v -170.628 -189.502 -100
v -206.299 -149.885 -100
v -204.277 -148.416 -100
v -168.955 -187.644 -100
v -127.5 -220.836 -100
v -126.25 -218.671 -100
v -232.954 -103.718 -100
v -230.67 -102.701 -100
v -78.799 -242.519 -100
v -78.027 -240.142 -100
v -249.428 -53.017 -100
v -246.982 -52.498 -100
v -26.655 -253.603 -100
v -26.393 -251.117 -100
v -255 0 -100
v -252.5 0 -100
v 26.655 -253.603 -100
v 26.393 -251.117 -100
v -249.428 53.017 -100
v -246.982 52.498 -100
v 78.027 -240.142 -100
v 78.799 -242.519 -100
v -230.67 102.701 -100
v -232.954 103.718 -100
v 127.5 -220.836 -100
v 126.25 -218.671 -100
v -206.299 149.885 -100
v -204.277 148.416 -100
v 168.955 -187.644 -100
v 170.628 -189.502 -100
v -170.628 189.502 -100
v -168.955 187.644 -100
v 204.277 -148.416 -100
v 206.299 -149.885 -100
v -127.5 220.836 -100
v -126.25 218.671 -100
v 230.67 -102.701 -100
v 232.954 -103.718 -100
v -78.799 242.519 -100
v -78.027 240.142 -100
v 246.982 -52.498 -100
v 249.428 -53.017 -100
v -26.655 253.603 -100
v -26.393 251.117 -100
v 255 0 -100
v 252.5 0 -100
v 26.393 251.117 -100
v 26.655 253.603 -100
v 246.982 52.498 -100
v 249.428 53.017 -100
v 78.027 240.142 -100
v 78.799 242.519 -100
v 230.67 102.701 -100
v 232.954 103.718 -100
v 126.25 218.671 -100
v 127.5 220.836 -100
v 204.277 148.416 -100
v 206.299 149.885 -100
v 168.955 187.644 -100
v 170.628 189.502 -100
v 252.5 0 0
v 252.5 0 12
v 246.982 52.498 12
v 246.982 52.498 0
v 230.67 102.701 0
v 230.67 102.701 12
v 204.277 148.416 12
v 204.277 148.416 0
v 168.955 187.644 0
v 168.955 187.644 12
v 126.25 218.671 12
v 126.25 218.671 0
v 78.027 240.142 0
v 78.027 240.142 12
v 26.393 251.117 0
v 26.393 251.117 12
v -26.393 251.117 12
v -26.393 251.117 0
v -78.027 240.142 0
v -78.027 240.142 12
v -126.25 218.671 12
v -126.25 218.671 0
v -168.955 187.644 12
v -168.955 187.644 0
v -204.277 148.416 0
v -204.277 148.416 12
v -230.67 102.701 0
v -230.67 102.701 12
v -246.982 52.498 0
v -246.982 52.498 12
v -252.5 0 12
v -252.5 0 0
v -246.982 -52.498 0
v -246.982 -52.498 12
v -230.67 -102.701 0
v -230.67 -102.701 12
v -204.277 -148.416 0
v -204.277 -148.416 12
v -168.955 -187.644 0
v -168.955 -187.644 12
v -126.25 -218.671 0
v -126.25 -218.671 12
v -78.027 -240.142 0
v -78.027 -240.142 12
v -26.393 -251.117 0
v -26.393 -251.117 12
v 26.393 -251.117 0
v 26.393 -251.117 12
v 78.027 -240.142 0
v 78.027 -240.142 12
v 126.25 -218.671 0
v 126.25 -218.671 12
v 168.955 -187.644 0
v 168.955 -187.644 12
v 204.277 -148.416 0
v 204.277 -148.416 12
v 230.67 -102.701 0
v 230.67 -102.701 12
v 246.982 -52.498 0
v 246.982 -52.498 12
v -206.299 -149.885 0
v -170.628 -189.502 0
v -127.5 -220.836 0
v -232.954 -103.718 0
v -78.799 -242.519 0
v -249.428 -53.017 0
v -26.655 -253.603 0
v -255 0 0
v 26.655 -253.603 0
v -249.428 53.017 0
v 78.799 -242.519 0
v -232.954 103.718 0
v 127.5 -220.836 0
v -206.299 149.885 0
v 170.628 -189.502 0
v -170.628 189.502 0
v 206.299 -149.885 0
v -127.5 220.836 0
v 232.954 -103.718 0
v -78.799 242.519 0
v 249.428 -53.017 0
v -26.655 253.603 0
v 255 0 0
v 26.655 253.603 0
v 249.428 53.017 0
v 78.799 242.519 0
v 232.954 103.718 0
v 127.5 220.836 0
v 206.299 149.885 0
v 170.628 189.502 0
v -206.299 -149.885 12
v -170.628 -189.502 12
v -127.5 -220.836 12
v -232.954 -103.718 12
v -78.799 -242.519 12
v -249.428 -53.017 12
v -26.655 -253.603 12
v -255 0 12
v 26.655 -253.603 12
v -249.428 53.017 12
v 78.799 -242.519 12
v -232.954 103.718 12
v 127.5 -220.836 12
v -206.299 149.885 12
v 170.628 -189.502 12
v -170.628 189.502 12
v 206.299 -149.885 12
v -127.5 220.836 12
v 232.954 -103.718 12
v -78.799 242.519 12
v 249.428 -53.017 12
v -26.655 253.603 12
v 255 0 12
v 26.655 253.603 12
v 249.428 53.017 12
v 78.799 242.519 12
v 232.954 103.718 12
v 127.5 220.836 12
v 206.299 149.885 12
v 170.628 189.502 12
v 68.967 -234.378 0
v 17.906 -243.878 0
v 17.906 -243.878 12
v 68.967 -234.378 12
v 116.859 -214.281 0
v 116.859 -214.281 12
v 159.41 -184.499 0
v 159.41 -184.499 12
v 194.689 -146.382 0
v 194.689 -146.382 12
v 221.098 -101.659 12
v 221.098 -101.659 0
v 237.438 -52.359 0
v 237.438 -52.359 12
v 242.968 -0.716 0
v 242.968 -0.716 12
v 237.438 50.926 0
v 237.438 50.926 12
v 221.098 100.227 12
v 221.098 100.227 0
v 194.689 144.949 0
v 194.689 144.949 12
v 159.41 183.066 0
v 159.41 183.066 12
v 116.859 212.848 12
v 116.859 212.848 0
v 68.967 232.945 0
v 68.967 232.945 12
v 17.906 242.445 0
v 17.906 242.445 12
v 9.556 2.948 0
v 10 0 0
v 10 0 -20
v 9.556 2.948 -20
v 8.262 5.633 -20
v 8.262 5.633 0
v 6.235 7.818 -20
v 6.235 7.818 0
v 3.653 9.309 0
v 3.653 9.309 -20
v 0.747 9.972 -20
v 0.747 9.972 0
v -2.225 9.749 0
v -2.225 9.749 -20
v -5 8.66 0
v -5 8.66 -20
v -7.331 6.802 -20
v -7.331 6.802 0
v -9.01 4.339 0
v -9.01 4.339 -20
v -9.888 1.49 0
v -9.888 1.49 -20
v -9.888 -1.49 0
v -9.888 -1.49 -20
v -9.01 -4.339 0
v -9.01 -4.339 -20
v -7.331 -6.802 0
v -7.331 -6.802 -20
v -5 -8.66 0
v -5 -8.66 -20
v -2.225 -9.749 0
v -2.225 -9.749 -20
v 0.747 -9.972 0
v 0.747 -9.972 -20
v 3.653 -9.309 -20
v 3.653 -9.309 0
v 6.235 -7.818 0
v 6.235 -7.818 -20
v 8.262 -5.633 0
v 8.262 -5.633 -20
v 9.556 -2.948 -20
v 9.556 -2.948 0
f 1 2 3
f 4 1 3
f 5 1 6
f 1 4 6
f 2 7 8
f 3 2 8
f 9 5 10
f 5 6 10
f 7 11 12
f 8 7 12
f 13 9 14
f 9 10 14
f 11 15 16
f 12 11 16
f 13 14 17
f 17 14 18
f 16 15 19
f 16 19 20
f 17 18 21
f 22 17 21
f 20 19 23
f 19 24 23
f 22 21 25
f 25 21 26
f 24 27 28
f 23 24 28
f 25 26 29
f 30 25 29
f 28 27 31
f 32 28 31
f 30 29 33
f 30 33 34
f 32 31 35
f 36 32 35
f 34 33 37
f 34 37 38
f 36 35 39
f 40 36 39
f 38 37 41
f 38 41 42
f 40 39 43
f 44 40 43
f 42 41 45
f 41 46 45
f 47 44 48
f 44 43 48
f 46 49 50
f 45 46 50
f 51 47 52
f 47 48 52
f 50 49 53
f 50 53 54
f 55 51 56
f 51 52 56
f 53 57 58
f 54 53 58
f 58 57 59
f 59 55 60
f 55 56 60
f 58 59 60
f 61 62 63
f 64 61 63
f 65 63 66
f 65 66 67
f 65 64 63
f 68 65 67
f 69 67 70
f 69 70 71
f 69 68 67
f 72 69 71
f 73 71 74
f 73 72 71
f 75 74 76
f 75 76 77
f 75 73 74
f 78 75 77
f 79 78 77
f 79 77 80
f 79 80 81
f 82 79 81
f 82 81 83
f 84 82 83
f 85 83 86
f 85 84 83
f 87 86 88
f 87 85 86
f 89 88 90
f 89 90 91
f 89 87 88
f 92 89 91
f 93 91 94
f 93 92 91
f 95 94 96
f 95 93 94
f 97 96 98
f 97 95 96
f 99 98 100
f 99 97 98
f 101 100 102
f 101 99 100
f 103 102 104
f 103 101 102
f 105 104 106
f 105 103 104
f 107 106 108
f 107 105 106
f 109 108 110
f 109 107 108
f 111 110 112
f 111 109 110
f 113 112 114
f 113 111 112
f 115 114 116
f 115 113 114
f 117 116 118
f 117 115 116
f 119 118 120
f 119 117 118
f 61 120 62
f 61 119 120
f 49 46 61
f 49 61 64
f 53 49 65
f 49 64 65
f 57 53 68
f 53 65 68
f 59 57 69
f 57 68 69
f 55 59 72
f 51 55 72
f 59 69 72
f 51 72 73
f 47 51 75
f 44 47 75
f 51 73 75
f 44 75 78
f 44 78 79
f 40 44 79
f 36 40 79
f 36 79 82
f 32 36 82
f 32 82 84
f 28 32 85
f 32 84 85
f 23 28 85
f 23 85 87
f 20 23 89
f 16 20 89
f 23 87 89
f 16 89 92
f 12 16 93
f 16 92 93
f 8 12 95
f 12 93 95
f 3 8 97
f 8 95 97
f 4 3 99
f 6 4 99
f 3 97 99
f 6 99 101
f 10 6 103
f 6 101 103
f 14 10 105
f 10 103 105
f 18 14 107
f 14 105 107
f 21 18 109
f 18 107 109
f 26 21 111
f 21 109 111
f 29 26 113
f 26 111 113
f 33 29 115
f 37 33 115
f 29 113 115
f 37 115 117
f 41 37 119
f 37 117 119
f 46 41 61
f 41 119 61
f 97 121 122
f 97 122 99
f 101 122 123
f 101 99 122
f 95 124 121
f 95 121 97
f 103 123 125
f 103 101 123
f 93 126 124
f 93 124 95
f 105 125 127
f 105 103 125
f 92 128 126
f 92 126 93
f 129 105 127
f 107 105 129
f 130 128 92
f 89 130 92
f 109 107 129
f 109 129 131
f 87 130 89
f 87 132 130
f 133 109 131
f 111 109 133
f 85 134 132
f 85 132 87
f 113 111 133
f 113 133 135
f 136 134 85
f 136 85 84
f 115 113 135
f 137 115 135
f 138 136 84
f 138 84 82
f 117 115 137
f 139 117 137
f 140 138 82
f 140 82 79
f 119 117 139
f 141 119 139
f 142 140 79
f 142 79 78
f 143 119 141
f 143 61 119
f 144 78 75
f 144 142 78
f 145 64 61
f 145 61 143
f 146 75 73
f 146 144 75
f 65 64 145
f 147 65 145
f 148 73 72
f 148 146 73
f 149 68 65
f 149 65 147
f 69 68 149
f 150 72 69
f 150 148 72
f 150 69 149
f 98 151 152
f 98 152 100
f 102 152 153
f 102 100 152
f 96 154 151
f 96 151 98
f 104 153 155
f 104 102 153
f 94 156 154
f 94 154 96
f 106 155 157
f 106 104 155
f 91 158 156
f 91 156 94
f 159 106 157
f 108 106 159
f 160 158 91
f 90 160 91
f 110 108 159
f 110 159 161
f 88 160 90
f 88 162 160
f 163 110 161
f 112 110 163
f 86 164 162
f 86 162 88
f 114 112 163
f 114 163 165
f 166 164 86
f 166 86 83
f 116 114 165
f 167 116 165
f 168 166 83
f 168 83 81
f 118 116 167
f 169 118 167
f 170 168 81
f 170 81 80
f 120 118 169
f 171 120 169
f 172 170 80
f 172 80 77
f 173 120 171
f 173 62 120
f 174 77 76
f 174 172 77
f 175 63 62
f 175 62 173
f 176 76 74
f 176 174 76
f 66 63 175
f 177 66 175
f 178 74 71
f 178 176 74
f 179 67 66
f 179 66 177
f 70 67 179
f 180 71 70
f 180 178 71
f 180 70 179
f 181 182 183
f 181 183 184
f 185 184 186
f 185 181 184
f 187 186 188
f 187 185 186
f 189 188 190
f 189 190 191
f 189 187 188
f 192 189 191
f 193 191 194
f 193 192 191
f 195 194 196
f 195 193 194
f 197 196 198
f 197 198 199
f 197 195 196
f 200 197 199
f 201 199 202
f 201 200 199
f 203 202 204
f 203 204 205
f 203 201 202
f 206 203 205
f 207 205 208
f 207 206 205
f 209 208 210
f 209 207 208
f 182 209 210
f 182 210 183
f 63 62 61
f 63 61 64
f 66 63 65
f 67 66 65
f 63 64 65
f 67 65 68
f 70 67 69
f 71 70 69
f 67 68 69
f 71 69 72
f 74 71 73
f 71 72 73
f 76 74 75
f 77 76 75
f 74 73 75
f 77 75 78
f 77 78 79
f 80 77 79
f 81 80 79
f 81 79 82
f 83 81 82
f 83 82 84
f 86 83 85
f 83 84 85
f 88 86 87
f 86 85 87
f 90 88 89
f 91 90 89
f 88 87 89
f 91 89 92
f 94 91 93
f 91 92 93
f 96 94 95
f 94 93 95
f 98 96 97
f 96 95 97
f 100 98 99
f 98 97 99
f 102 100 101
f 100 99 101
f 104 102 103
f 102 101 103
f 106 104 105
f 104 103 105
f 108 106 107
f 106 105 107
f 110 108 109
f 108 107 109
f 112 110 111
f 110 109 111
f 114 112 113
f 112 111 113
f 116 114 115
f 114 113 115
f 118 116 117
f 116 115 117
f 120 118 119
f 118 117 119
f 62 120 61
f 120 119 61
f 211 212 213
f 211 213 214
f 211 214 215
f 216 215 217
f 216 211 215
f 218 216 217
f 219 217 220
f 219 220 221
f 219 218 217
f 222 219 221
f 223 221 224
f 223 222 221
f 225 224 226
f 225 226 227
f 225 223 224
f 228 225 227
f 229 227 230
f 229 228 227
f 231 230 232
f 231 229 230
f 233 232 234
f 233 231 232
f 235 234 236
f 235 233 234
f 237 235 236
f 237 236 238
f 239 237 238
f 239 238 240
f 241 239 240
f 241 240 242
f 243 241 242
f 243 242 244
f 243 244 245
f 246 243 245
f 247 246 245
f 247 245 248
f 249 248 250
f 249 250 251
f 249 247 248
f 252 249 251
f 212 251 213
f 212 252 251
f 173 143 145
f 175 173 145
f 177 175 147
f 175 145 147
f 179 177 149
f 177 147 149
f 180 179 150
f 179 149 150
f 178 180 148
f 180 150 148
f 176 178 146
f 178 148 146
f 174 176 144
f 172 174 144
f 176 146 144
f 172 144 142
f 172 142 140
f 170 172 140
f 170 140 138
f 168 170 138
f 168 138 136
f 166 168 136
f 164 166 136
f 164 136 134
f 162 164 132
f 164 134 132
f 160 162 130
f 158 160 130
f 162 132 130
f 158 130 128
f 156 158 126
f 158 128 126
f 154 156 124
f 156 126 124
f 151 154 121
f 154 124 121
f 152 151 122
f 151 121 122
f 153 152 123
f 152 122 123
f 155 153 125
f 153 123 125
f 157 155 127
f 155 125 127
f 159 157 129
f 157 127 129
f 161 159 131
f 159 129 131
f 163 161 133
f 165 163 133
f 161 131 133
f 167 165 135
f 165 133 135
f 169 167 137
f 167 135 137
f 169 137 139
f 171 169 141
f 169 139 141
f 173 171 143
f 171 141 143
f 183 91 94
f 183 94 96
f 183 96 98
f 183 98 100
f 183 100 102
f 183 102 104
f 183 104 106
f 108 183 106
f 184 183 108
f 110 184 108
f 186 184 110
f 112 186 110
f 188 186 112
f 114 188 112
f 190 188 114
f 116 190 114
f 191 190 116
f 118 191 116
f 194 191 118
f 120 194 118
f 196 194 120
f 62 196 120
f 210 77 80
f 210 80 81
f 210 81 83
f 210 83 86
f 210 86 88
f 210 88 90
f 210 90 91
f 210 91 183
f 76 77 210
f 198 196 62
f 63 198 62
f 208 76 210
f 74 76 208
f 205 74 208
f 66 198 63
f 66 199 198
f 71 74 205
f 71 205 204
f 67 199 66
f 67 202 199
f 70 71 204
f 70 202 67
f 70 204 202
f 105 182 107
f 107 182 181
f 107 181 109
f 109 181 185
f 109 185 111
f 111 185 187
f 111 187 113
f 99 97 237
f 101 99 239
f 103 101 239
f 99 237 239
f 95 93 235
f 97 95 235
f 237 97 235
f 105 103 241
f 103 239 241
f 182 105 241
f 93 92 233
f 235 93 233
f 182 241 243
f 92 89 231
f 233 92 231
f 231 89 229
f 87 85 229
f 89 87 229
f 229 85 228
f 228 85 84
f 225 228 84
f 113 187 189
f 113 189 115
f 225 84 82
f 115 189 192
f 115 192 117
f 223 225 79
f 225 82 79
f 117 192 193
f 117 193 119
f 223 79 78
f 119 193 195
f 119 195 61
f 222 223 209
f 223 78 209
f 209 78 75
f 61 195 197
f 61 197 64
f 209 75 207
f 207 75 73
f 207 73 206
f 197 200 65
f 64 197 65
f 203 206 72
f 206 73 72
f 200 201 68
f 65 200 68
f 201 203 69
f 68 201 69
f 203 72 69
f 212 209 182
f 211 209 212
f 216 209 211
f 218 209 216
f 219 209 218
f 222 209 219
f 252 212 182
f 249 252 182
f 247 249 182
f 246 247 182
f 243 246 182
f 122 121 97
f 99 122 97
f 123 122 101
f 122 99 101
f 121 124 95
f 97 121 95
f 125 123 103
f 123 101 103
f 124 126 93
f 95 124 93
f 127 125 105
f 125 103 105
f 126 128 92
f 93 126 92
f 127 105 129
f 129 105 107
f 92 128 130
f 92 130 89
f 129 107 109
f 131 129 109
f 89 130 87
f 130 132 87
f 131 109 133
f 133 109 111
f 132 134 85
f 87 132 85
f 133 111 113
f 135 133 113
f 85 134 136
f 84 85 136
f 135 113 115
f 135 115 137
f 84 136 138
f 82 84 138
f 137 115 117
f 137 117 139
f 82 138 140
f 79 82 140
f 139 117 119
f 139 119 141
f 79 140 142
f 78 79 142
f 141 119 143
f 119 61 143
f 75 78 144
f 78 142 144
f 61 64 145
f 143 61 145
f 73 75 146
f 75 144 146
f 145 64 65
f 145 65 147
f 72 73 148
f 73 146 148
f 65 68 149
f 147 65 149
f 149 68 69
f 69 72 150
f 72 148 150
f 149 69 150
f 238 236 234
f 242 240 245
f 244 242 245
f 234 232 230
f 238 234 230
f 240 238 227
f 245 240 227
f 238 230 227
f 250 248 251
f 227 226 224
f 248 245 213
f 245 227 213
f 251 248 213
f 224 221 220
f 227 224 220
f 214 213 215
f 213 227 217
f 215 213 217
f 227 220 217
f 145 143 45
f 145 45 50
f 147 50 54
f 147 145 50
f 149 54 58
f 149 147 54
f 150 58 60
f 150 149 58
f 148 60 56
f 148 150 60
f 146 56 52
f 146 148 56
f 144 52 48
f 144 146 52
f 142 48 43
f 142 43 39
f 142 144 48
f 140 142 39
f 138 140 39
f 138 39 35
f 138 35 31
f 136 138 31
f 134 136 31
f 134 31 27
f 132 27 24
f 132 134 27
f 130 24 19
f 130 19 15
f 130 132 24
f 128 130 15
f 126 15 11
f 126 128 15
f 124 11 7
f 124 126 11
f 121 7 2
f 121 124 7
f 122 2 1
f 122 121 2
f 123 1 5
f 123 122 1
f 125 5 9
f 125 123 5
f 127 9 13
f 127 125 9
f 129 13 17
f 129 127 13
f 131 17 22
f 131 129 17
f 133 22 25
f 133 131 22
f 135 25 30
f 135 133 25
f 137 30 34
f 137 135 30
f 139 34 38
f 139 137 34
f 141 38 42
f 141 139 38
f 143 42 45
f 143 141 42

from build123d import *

# Parameters (mm, degrees)
F0_R     = 252.5
F1_DEPTH = 12
F2_R     = 10
F3_DEPTH = 20
F5_DEPTH = 12
F6_R     = 255
F6_R_2   = 252.5
F7_DEPTH = 100
F8_DEPTH = 12


with BuildPart() as f1:
    # F0 (on Top) → F1 (new body)
    with BuildSketch(Plane.XY):
        Circle(F0_R)
    extrude(amount=F1_DEPTH)

    # F2 (on Top) → F3 (join)
    with BuildSketch(Plane.XY):
        Circle(F2_R)
    extrude(amount=-F3_DEPTH)

    # F4 (on Top) → F5 (cut)
    with BuildSketch(Plane.XY):
        with BuildLine():
            Line((17.905863, 242.445424), (17.905863, 0))
            Line((17.905863, 0), (17.905863, -243.877903))
            ThreePointArc((17.905863, -243.877903), (242.967911, -0.716239), (17.905863, 242.445424))
        make_face()
    extrude(amount=F5_DEPTH, mode=Mode.SUBTRACT)


with BuildPart() as f7:
    # F6 (on Top) → F7 (new body)
    with BuildSketch(Plane.XY):
        Circle(F6_R)
        Circle(F6_R_2, mode=Mode.SUBTRACT)
    extrude(amount=-F7_DEPTH)


with BuildPart() as f8:
    # F6 (on Top) → F8 (new body)
    with BuildSketch(Plane.XY):
        Circle(F6_R)
        Circle(F6_R_2, mode=Mode.SUBTRACT)
    extrude(amount=F8_DEPTH)


solid = Compound([f1.part, f7.part, f8.part])
